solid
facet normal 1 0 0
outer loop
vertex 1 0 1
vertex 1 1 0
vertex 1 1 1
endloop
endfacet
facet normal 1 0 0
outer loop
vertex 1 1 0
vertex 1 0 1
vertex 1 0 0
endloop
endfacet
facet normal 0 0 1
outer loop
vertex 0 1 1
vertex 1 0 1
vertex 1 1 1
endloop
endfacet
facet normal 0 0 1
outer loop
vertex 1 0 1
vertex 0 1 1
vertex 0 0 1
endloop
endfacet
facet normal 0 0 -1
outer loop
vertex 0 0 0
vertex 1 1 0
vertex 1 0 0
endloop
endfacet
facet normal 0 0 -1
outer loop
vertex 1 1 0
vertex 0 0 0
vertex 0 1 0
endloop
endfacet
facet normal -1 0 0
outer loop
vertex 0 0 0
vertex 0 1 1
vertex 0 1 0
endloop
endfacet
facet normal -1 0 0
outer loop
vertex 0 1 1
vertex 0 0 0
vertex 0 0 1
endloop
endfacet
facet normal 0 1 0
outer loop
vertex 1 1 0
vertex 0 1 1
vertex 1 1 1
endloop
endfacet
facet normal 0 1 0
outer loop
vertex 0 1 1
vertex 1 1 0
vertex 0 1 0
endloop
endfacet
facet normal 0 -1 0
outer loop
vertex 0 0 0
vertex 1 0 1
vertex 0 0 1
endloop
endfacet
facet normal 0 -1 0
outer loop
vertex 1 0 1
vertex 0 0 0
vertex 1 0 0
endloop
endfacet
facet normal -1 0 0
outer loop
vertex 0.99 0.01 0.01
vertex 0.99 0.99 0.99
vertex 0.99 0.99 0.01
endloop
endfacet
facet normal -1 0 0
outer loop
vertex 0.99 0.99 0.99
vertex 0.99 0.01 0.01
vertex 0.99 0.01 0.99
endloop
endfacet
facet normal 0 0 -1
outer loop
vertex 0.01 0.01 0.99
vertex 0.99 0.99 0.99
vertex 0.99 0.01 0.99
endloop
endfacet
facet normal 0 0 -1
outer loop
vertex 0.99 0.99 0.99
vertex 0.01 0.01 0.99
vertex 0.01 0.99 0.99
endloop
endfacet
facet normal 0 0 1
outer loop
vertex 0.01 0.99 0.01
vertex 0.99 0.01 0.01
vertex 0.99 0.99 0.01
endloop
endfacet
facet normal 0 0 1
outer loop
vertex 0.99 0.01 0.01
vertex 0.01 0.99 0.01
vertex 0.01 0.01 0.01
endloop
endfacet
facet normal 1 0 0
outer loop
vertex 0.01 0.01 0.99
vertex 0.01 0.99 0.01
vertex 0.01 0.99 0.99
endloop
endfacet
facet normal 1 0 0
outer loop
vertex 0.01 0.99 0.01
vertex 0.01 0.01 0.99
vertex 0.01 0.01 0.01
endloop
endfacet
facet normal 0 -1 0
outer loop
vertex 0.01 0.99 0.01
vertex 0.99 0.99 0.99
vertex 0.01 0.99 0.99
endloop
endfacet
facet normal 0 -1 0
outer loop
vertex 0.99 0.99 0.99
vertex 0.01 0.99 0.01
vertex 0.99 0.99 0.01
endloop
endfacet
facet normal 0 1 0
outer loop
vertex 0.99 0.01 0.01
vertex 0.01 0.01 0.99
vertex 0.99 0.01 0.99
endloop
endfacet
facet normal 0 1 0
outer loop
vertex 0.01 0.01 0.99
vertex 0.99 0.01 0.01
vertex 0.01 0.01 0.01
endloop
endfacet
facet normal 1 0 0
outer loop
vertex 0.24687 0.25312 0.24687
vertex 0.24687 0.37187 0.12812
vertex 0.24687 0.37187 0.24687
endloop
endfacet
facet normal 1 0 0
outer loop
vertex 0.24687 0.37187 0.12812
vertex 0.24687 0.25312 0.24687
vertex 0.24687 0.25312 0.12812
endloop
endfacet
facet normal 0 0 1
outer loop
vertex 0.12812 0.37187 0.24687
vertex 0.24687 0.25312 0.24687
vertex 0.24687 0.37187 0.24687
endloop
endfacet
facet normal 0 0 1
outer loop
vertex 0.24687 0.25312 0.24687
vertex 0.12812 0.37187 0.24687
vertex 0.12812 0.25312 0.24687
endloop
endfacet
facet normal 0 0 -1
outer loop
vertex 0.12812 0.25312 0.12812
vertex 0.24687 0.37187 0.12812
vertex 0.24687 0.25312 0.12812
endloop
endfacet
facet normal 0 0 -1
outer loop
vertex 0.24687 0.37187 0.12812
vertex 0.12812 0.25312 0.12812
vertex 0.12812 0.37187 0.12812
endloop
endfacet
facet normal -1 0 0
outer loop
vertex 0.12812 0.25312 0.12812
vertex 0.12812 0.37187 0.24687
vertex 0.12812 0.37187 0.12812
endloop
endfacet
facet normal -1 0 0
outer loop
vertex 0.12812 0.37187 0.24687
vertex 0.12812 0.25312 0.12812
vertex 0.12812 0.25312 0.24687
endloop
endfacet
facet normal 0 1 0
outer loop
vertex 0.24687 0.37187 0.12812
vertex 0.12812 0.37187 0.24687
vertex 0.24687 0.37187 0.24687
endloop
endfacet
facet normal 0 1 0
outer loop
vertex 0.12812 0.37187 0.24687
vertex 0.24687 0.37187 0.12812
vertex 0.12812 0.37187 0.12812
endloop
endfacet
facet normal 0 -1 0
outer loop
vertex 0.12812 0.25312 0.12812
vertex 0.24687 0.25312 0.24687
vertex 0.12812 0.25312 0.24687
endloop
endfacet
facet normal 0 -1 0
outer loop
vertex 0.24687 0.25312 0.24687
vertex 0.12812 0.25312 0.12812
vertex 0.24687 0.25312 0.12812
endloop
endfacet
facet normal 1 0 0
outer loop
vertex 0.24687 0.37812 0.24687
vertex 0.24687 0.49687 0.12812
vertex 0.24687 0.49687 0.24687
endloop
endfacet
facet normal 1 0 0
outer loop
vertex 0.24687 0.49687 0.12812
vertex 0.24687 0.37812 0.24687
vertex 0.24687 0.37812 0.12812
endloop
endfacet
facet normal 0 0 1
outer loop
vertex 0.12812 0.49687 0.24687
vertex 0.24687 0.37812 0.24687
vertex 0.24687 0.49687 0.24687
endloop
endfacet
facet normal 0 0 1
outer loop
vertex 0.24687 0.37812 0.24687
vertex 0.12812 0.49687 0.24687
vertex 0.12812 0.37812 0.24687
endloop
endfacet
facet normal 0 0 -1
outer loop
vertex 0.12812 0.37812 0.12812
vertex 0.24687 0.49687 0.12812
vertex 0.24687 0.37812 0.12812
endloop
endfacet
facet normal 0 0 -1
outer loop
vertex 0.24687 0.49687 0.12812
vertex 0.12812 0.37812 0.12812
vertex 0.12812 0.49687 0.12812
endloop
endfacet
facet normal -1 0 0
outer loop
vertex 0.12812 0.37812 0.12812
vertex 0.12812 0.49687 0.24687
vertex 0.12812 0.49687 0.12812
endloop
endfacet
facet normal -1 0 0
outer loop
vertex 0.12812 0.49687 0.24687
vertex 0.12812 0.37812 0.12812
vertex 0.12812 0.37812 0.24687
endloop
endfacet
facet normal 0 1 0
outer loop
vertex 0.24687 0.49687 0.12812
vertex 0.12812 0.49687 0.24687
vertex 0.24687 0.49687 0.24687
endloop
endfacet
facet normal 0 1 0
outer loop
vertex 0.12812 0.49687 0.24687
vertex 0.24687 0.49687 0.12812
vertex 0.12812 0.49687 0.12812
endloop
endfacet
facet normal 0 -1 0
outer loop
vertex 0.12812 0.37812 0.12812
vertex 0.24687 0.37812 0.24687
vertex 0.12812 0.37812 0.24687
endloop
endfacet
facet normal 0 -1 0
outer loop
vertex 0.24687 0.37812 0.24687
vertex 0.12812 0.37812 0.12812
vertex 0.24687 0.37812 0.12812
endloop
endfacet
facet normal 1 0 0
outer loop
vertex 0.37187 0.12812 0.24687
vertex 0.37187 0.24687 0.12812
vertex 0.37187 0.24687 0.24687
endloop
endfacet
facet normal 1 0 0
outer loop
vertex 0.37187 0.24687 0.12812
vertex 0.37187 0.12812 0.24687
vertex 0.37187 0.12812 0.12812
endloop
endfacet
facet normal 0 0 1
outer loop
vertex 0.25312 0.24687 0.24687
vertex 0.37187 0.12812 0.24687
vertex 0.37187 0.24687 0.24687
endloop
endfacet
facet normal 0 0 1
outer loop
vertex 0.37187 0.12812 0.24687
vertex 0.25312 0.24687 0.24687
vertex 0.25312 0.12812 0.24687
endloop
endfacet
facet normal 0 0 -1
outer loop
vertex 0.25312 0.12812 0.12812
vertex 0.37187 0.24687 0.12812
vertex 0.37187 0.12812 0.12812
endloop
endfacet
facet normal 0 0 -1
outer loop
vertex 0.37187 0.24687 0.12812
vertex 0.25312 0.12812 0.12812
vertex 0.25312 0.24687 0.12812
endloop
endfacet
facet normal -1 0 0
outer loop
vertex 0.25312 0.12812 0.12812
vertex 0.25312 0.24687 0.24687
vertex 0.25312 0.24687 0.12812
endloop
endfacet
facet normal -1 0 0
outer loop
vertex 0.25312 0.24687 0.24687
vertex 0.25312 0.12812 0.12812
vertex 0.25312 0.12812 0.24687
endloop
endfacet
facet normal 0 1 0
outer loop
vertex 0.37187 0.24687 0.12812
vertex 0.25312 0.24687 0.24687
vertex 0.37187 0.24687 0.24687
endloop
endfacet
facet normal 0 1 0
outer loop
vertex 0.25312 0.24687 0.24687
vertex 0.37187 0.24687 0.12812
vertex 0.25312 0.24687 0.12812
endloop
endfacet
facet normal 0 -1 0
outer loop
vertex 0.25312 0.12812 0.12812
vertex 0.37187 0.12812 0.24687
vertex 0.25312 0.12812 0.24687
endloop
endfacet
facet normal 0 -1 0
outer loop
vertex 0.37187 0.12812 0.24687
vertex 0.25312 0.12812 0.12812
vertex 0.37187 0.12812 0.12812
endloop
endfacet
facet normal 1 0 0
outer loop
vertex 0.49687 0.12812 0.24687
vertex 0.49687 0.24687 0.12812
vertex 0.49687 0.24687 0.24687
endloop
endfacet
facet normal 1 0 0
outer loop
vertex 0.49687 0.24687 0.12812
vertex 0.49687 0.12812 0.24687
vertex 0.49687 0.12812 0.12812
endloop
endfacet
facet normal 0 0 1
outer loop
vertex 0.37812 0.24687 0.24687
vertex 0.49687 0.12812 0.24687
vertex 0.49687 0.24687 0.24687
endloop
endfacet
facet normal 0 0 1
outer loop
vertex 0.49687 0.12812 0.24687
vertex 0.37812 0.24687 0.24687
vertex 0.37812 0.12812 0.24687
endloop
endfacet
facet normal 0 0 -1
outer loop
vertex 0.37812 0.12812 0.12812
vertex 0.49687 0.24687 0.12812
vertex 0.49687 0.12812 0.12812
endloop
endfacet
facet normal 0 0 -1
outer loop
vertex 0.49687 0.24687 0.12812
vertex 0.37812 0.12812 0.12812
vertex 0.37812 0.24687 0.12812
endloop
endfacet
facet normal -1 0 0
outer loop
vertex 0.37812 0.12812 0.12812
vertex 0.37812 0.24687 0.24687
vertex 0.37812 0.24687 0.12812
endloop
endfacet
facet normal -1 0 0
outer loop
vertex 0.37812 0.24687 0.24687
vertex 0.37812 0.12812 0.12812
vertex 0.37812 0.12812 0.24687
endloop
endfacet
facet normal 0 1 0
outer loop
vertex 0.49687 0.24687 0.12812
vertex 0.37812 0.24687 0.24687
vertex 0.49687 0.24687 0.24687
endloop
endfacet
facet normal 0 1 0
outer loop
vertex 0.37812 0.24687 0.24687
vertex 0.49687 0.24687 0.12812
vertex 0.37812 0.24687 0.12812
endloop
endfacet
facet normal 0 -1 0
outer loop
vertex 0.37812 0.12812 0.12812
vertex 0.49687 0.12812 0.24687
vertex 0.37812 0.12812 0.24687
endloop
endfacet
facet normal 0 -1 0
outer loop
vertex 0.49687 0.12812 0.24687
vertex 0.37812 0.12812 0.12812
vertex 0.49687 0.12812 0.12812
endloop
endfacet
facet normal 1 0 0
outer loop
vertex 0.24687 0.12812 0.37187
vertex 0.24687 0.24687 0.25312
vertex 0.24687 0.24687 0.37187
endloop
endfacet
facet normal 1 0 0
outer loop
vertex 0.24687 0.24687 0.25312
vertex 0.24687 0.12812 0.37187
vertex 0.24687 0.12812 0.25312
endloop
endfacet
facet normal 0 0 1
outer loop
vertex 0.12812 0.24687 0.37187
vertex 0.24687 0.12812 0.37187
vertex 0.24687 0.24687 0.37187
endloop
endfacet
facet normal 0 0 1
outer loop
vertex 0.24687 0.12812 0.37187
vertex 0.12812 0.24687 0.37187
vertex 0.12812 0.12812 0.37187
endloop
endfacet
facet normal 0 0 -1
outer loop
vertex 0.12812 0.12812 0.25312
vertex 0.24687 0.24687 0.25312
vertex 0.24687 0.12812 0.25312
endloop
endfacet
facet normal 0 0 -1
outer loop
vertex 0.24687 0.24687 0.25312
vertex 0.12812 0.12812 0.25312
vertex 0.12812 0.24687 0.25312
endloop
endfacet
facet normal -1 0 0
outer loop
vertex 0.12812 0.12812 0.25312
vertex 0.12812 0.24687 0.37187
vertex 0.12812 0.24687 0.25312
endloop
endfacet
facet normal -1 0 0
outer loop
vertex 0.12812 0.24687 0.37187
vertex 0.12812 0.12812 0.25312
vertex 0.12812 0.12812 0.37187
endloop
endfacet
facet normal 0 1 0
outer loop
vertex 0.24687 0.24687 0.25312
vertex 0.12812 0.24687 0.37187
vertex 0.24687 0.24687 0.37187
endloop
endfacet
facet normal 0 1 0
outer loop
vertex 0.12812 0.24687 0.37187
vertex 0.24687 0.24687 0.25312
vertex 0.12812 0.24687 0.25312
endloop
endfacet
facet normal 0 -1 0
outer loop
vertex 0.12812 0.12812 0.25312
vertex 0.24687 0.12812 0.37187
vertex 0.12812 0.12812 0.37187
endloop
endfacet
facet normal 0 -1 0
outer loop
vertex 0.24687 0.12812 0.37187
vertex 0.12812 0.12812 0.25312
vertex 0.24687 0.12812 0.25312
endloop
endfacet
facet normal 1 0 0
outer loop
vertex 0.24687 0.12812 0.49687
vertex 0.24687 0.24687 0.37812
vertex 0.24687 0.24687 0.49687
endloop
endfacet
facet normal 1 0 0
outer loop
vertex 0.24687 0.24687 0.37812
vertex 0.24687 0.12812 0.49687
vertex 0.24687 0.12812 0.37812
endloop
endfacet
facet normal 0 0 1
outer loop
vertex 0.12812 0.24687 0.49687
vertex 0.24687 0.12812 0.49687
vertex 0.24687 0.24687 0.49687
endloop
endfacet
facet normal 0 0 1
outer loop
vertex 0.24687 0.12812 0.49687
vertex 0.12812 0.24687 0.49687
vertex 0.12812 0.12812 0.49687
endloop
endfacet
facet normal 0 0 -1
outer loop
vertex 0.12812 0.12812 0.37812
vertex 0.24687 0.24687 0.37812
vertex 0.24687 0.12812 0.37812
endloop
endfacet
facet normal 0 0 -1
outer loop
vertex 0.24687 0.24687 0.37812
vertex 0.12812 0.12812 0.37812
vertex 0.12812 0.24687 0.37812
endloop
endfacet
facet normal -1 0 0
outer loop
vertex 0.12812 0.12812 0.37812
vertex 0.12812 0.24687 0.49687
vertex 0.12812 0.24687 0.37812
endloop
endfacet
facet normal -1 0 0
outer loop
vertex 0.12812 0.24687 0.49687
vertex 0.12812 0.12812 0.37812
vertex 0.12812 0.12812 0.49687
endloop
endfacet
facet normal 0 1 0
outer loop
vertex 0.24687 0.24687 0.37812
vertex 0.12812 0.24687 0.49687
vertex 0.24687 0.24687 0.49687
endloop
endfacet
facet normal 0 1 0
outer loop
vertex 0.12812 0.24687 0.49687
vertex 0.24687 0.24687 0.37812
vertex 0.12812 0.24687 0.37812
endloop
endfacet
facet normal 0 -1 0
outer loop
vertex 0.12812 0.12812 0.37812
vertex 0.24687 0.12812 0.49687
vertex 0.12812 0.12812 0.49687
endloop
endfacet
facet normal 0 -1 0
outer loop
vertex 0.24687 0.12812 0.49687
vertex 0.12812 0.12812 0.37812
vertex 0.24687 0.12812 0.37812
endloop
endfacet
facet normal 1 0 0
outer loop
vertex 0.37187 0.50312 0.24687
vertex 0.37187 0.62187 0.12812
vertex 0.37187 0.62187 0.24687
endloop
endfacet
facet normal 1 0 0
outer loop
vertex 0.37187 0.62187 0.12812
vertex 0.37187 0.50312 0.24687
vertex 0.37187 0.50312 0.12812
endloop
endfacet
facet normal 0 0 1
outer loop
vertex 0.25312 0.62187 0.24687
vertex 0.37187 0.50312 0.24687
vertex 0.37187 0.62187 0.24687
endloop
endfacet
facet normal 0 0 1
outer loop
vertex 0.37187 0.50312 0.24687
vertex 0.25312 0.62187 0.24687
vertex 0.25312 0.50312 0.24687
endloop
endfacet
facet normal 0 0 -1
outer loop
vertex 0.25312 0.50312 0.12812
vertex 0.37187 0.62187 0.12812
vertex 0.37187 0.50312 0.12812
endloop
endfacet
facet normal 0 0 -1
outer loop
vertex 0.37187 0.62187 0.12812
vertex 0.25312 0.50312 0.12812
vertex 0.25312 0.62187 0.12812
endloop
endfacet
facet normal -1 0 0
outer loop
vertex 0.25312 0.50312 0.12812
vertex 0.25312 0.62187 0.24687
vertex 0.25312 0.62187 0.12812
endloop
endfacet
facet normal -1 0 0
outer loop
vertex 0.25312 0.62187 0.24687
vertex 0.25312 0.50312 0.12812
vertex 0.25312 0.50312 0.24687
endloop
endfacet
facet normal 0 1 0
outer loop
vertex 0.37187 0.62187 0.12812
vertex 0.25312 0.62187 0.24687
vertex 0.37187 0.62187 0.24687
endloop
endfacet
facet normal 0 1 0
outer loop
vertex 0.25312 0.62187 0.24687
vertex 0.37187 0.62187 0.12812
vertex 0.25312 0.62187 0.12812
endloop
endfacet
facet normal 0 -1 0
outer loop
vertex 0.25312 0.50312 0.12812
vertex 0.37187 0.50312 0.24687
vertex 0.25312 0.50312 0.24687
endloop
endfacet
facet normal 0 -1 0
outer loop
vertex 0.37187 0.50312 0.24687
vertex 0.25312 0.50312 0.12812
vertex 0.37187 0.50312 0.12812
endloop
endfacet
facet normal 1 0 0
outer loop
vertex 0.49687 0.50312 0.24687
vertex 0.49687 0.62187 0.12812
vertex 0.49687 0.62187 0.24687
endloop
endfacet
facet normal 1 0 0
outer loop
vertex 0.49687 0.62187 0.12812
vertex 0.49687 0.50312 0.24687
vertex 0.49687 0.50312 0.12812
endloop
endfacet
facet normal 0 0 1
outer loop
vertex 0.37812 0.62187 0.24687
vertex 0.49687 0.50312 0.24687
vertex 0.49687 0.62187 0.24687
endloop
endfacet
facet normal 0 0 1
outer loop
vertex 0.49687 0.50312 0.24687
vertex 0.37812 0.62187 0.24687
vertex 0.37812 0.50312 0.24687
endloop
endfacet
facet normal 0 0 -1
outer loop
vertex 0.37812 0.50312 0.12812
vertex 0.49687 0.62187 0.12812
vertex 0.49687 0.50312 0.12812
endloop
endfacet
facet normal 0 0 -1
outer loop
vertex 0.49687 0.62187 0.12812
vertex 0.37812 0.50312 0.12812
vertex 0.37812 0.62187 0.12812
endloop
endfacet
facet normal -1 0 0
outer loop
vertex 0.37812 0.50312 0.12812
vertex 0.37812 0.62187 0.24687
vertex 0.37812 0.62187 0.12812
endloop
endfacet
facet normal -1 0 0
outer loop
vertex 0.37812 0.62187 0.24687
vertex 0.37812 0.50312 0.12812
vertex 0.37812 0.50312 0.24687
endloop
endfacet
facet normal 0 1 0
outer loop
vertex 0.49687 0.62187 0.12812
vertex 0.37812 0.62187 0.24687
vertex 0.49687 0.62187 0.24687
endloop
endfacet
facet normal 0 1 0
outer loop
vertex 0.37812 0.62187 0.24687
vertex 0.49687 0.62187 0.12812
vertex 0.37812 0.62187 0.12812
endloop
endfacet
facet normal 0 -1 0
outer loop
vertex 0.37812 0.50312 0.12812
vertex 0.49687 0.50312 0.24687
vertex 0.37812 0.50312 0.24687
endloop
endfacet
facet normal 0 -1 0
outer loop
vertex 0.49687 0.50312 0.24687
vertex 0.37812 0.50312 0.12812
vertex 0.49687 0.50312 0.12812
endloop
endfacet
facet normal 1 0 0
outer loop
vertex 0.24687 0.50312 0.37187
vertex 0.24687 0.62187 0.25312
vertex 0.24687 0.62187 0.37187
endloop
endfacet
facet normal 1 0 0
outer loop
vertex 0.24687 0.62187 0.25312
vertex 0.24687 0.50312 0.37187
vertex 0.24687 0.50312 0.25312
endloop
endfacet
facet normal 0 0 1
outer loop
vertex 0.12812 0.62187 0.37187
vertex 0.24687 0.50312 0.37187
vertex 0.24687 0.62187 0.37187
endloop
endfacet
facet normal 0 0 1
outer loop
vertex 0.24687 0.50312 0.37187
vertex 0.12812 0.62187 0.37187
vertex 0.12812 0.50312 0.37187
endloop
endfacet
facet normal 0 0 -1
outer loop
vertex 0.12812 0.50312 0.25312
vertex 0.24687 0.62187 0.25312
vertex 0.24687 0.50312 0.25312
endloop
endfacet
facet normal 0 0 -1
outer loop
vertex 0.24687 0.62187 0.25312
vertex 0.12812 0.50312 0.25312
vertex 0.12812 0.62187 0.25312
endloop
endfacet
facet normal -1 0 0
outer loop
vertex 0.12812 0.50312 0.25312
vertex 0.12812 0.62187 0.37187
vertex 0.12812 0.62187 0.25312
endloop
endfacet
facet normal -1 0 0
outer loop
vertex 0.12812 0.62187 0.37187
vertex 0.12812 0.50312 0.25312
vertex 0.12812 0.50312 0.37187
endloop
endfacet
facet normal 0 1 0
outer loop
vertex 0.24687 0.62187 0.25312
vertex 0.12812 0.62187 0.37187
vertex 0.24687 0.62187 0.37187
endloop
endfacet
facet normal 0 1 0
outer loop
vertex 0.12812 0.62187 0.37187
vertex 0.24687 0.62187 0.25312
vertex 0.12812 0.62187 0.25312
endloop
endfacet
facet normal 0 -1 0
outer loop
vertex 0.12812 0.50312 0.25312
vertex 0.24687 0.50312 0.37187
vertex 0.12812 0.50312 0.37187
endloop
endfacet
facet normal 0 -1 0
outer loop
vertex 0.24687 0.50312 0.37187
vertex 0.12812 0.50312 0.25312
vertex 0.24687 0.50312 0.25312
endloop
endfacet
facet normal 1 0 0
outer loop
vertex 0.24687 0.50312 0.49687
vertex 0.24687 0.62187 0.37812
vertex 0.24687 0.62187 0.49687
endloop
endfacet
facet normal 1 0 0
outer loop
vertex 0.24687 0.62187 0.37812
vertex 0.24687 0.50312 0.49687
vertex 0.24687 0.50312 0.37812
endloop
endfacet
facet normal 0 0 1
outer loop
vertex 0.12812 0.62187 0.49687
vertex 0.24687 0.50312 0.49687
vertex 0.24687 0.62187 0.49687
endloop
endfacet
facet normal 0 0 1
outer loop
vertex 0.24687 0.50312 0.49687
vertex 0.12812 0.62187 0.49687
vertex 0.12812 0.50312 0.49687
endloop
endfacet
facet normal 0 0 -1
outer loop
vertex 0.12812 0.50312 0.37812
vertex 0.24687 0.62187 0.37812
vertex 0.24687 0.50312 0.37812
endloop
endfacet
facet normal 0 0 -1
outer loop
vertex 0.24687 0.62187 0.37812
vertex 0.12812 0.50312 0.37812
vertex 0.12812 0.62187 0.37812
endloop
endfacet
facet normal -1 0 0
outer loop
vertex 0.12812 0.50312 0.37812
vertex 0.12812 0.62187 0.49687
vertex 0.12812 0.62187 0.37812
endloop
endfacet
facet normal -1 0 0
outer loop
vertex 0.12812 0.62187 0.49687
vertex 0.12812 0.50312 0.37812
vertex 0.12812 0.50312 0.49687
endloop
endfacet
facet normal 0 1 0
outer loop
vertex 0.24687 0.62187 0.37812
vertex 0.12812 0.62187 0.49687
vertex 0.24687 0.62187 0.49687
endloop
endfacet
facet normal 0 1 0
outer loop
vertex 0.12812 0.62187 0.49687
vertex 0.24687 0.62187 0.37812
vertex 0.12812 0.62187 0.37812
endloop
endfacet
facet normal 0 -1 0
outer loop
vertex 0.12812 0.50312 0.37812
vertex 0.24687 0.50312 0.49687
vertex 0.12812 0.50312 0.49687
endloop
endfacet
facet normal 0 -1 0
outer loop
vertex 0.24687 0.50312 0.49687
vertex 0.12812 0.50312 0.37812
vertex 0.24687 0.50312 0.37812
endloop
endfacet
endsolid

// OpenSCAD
translate([0.1875, 0.3125, 0.1875]) color([0.8164974663102325, 0.2293233679941057, 0.46182531977770136]) cube([0.11875, 0.11875, 0.11875], center=true);
translate([0.1875, 0.4375, 0.1875]) color([0.8208672033965949, 0.1425889658039624, 0.4304805432983927]) cube([0.11875, 0.11875, 0.11875], center=true);
translate([0.3125, 0.1875, 0.1875]) color([0.8546068541677182, 0.7470747855427565, 0.22010504500412065]) cube([0.11875, 0.11875, 0.11875], center=true);
translate([0.4375, 0.1875, 0.1875]) color([0.9763211891961895, 0.3332234619658775, 0.77727738342706]) cube([0.11875, 0.11875, 0.11875], center=true);
translate([0.1875, 0.1875, 0.3125]) color([0.8124662846941718, 0.11763161941623446, 0.5035435967710412]) cube([0.11875, 0.11875, 0.11875], center=true);
translate([0.1875, 0.1875, 0.4375]) color([0.8482843671629627, 0.3340857271419285, 0.7552129401210048]) cube([0.11875, 0.11875, 0.11875], center=true);
translate([0.3125, 0.5625, 0.1875]) color([0.10101420454991783, 0.11693470956344298, 0.5845018937762212]) cube([0.11875, 0.11875, 0.11875], center=true);
translate([0.4375, 0.5625, 0.1875]) color([0.7619268976546947, 0.537817359096354, 0.6729499311091772]) cube([0.11875, 0.11875, 0.11875], center=true);
translate([0.1875, 0.5625, 0.3125]) color([0.5322678457464811, 0.6047463199091118, 0.6712793142137794]) cube([0.11875, 0.11875, 0.11875], center=true);
translate([0.1875, 0.5625, 0.4375]) color([0.22249676374829053, 0.321816079582252, 0.509264793781758]) cube([0.11875, 0.11875, 0.11875], center=true);
color([0.3,0.3,0.3,0.3]) difference() { cube([1,1,1]); translate([0.01,0.01,0.01]) cube([0.98,0.98,0.98]); }
